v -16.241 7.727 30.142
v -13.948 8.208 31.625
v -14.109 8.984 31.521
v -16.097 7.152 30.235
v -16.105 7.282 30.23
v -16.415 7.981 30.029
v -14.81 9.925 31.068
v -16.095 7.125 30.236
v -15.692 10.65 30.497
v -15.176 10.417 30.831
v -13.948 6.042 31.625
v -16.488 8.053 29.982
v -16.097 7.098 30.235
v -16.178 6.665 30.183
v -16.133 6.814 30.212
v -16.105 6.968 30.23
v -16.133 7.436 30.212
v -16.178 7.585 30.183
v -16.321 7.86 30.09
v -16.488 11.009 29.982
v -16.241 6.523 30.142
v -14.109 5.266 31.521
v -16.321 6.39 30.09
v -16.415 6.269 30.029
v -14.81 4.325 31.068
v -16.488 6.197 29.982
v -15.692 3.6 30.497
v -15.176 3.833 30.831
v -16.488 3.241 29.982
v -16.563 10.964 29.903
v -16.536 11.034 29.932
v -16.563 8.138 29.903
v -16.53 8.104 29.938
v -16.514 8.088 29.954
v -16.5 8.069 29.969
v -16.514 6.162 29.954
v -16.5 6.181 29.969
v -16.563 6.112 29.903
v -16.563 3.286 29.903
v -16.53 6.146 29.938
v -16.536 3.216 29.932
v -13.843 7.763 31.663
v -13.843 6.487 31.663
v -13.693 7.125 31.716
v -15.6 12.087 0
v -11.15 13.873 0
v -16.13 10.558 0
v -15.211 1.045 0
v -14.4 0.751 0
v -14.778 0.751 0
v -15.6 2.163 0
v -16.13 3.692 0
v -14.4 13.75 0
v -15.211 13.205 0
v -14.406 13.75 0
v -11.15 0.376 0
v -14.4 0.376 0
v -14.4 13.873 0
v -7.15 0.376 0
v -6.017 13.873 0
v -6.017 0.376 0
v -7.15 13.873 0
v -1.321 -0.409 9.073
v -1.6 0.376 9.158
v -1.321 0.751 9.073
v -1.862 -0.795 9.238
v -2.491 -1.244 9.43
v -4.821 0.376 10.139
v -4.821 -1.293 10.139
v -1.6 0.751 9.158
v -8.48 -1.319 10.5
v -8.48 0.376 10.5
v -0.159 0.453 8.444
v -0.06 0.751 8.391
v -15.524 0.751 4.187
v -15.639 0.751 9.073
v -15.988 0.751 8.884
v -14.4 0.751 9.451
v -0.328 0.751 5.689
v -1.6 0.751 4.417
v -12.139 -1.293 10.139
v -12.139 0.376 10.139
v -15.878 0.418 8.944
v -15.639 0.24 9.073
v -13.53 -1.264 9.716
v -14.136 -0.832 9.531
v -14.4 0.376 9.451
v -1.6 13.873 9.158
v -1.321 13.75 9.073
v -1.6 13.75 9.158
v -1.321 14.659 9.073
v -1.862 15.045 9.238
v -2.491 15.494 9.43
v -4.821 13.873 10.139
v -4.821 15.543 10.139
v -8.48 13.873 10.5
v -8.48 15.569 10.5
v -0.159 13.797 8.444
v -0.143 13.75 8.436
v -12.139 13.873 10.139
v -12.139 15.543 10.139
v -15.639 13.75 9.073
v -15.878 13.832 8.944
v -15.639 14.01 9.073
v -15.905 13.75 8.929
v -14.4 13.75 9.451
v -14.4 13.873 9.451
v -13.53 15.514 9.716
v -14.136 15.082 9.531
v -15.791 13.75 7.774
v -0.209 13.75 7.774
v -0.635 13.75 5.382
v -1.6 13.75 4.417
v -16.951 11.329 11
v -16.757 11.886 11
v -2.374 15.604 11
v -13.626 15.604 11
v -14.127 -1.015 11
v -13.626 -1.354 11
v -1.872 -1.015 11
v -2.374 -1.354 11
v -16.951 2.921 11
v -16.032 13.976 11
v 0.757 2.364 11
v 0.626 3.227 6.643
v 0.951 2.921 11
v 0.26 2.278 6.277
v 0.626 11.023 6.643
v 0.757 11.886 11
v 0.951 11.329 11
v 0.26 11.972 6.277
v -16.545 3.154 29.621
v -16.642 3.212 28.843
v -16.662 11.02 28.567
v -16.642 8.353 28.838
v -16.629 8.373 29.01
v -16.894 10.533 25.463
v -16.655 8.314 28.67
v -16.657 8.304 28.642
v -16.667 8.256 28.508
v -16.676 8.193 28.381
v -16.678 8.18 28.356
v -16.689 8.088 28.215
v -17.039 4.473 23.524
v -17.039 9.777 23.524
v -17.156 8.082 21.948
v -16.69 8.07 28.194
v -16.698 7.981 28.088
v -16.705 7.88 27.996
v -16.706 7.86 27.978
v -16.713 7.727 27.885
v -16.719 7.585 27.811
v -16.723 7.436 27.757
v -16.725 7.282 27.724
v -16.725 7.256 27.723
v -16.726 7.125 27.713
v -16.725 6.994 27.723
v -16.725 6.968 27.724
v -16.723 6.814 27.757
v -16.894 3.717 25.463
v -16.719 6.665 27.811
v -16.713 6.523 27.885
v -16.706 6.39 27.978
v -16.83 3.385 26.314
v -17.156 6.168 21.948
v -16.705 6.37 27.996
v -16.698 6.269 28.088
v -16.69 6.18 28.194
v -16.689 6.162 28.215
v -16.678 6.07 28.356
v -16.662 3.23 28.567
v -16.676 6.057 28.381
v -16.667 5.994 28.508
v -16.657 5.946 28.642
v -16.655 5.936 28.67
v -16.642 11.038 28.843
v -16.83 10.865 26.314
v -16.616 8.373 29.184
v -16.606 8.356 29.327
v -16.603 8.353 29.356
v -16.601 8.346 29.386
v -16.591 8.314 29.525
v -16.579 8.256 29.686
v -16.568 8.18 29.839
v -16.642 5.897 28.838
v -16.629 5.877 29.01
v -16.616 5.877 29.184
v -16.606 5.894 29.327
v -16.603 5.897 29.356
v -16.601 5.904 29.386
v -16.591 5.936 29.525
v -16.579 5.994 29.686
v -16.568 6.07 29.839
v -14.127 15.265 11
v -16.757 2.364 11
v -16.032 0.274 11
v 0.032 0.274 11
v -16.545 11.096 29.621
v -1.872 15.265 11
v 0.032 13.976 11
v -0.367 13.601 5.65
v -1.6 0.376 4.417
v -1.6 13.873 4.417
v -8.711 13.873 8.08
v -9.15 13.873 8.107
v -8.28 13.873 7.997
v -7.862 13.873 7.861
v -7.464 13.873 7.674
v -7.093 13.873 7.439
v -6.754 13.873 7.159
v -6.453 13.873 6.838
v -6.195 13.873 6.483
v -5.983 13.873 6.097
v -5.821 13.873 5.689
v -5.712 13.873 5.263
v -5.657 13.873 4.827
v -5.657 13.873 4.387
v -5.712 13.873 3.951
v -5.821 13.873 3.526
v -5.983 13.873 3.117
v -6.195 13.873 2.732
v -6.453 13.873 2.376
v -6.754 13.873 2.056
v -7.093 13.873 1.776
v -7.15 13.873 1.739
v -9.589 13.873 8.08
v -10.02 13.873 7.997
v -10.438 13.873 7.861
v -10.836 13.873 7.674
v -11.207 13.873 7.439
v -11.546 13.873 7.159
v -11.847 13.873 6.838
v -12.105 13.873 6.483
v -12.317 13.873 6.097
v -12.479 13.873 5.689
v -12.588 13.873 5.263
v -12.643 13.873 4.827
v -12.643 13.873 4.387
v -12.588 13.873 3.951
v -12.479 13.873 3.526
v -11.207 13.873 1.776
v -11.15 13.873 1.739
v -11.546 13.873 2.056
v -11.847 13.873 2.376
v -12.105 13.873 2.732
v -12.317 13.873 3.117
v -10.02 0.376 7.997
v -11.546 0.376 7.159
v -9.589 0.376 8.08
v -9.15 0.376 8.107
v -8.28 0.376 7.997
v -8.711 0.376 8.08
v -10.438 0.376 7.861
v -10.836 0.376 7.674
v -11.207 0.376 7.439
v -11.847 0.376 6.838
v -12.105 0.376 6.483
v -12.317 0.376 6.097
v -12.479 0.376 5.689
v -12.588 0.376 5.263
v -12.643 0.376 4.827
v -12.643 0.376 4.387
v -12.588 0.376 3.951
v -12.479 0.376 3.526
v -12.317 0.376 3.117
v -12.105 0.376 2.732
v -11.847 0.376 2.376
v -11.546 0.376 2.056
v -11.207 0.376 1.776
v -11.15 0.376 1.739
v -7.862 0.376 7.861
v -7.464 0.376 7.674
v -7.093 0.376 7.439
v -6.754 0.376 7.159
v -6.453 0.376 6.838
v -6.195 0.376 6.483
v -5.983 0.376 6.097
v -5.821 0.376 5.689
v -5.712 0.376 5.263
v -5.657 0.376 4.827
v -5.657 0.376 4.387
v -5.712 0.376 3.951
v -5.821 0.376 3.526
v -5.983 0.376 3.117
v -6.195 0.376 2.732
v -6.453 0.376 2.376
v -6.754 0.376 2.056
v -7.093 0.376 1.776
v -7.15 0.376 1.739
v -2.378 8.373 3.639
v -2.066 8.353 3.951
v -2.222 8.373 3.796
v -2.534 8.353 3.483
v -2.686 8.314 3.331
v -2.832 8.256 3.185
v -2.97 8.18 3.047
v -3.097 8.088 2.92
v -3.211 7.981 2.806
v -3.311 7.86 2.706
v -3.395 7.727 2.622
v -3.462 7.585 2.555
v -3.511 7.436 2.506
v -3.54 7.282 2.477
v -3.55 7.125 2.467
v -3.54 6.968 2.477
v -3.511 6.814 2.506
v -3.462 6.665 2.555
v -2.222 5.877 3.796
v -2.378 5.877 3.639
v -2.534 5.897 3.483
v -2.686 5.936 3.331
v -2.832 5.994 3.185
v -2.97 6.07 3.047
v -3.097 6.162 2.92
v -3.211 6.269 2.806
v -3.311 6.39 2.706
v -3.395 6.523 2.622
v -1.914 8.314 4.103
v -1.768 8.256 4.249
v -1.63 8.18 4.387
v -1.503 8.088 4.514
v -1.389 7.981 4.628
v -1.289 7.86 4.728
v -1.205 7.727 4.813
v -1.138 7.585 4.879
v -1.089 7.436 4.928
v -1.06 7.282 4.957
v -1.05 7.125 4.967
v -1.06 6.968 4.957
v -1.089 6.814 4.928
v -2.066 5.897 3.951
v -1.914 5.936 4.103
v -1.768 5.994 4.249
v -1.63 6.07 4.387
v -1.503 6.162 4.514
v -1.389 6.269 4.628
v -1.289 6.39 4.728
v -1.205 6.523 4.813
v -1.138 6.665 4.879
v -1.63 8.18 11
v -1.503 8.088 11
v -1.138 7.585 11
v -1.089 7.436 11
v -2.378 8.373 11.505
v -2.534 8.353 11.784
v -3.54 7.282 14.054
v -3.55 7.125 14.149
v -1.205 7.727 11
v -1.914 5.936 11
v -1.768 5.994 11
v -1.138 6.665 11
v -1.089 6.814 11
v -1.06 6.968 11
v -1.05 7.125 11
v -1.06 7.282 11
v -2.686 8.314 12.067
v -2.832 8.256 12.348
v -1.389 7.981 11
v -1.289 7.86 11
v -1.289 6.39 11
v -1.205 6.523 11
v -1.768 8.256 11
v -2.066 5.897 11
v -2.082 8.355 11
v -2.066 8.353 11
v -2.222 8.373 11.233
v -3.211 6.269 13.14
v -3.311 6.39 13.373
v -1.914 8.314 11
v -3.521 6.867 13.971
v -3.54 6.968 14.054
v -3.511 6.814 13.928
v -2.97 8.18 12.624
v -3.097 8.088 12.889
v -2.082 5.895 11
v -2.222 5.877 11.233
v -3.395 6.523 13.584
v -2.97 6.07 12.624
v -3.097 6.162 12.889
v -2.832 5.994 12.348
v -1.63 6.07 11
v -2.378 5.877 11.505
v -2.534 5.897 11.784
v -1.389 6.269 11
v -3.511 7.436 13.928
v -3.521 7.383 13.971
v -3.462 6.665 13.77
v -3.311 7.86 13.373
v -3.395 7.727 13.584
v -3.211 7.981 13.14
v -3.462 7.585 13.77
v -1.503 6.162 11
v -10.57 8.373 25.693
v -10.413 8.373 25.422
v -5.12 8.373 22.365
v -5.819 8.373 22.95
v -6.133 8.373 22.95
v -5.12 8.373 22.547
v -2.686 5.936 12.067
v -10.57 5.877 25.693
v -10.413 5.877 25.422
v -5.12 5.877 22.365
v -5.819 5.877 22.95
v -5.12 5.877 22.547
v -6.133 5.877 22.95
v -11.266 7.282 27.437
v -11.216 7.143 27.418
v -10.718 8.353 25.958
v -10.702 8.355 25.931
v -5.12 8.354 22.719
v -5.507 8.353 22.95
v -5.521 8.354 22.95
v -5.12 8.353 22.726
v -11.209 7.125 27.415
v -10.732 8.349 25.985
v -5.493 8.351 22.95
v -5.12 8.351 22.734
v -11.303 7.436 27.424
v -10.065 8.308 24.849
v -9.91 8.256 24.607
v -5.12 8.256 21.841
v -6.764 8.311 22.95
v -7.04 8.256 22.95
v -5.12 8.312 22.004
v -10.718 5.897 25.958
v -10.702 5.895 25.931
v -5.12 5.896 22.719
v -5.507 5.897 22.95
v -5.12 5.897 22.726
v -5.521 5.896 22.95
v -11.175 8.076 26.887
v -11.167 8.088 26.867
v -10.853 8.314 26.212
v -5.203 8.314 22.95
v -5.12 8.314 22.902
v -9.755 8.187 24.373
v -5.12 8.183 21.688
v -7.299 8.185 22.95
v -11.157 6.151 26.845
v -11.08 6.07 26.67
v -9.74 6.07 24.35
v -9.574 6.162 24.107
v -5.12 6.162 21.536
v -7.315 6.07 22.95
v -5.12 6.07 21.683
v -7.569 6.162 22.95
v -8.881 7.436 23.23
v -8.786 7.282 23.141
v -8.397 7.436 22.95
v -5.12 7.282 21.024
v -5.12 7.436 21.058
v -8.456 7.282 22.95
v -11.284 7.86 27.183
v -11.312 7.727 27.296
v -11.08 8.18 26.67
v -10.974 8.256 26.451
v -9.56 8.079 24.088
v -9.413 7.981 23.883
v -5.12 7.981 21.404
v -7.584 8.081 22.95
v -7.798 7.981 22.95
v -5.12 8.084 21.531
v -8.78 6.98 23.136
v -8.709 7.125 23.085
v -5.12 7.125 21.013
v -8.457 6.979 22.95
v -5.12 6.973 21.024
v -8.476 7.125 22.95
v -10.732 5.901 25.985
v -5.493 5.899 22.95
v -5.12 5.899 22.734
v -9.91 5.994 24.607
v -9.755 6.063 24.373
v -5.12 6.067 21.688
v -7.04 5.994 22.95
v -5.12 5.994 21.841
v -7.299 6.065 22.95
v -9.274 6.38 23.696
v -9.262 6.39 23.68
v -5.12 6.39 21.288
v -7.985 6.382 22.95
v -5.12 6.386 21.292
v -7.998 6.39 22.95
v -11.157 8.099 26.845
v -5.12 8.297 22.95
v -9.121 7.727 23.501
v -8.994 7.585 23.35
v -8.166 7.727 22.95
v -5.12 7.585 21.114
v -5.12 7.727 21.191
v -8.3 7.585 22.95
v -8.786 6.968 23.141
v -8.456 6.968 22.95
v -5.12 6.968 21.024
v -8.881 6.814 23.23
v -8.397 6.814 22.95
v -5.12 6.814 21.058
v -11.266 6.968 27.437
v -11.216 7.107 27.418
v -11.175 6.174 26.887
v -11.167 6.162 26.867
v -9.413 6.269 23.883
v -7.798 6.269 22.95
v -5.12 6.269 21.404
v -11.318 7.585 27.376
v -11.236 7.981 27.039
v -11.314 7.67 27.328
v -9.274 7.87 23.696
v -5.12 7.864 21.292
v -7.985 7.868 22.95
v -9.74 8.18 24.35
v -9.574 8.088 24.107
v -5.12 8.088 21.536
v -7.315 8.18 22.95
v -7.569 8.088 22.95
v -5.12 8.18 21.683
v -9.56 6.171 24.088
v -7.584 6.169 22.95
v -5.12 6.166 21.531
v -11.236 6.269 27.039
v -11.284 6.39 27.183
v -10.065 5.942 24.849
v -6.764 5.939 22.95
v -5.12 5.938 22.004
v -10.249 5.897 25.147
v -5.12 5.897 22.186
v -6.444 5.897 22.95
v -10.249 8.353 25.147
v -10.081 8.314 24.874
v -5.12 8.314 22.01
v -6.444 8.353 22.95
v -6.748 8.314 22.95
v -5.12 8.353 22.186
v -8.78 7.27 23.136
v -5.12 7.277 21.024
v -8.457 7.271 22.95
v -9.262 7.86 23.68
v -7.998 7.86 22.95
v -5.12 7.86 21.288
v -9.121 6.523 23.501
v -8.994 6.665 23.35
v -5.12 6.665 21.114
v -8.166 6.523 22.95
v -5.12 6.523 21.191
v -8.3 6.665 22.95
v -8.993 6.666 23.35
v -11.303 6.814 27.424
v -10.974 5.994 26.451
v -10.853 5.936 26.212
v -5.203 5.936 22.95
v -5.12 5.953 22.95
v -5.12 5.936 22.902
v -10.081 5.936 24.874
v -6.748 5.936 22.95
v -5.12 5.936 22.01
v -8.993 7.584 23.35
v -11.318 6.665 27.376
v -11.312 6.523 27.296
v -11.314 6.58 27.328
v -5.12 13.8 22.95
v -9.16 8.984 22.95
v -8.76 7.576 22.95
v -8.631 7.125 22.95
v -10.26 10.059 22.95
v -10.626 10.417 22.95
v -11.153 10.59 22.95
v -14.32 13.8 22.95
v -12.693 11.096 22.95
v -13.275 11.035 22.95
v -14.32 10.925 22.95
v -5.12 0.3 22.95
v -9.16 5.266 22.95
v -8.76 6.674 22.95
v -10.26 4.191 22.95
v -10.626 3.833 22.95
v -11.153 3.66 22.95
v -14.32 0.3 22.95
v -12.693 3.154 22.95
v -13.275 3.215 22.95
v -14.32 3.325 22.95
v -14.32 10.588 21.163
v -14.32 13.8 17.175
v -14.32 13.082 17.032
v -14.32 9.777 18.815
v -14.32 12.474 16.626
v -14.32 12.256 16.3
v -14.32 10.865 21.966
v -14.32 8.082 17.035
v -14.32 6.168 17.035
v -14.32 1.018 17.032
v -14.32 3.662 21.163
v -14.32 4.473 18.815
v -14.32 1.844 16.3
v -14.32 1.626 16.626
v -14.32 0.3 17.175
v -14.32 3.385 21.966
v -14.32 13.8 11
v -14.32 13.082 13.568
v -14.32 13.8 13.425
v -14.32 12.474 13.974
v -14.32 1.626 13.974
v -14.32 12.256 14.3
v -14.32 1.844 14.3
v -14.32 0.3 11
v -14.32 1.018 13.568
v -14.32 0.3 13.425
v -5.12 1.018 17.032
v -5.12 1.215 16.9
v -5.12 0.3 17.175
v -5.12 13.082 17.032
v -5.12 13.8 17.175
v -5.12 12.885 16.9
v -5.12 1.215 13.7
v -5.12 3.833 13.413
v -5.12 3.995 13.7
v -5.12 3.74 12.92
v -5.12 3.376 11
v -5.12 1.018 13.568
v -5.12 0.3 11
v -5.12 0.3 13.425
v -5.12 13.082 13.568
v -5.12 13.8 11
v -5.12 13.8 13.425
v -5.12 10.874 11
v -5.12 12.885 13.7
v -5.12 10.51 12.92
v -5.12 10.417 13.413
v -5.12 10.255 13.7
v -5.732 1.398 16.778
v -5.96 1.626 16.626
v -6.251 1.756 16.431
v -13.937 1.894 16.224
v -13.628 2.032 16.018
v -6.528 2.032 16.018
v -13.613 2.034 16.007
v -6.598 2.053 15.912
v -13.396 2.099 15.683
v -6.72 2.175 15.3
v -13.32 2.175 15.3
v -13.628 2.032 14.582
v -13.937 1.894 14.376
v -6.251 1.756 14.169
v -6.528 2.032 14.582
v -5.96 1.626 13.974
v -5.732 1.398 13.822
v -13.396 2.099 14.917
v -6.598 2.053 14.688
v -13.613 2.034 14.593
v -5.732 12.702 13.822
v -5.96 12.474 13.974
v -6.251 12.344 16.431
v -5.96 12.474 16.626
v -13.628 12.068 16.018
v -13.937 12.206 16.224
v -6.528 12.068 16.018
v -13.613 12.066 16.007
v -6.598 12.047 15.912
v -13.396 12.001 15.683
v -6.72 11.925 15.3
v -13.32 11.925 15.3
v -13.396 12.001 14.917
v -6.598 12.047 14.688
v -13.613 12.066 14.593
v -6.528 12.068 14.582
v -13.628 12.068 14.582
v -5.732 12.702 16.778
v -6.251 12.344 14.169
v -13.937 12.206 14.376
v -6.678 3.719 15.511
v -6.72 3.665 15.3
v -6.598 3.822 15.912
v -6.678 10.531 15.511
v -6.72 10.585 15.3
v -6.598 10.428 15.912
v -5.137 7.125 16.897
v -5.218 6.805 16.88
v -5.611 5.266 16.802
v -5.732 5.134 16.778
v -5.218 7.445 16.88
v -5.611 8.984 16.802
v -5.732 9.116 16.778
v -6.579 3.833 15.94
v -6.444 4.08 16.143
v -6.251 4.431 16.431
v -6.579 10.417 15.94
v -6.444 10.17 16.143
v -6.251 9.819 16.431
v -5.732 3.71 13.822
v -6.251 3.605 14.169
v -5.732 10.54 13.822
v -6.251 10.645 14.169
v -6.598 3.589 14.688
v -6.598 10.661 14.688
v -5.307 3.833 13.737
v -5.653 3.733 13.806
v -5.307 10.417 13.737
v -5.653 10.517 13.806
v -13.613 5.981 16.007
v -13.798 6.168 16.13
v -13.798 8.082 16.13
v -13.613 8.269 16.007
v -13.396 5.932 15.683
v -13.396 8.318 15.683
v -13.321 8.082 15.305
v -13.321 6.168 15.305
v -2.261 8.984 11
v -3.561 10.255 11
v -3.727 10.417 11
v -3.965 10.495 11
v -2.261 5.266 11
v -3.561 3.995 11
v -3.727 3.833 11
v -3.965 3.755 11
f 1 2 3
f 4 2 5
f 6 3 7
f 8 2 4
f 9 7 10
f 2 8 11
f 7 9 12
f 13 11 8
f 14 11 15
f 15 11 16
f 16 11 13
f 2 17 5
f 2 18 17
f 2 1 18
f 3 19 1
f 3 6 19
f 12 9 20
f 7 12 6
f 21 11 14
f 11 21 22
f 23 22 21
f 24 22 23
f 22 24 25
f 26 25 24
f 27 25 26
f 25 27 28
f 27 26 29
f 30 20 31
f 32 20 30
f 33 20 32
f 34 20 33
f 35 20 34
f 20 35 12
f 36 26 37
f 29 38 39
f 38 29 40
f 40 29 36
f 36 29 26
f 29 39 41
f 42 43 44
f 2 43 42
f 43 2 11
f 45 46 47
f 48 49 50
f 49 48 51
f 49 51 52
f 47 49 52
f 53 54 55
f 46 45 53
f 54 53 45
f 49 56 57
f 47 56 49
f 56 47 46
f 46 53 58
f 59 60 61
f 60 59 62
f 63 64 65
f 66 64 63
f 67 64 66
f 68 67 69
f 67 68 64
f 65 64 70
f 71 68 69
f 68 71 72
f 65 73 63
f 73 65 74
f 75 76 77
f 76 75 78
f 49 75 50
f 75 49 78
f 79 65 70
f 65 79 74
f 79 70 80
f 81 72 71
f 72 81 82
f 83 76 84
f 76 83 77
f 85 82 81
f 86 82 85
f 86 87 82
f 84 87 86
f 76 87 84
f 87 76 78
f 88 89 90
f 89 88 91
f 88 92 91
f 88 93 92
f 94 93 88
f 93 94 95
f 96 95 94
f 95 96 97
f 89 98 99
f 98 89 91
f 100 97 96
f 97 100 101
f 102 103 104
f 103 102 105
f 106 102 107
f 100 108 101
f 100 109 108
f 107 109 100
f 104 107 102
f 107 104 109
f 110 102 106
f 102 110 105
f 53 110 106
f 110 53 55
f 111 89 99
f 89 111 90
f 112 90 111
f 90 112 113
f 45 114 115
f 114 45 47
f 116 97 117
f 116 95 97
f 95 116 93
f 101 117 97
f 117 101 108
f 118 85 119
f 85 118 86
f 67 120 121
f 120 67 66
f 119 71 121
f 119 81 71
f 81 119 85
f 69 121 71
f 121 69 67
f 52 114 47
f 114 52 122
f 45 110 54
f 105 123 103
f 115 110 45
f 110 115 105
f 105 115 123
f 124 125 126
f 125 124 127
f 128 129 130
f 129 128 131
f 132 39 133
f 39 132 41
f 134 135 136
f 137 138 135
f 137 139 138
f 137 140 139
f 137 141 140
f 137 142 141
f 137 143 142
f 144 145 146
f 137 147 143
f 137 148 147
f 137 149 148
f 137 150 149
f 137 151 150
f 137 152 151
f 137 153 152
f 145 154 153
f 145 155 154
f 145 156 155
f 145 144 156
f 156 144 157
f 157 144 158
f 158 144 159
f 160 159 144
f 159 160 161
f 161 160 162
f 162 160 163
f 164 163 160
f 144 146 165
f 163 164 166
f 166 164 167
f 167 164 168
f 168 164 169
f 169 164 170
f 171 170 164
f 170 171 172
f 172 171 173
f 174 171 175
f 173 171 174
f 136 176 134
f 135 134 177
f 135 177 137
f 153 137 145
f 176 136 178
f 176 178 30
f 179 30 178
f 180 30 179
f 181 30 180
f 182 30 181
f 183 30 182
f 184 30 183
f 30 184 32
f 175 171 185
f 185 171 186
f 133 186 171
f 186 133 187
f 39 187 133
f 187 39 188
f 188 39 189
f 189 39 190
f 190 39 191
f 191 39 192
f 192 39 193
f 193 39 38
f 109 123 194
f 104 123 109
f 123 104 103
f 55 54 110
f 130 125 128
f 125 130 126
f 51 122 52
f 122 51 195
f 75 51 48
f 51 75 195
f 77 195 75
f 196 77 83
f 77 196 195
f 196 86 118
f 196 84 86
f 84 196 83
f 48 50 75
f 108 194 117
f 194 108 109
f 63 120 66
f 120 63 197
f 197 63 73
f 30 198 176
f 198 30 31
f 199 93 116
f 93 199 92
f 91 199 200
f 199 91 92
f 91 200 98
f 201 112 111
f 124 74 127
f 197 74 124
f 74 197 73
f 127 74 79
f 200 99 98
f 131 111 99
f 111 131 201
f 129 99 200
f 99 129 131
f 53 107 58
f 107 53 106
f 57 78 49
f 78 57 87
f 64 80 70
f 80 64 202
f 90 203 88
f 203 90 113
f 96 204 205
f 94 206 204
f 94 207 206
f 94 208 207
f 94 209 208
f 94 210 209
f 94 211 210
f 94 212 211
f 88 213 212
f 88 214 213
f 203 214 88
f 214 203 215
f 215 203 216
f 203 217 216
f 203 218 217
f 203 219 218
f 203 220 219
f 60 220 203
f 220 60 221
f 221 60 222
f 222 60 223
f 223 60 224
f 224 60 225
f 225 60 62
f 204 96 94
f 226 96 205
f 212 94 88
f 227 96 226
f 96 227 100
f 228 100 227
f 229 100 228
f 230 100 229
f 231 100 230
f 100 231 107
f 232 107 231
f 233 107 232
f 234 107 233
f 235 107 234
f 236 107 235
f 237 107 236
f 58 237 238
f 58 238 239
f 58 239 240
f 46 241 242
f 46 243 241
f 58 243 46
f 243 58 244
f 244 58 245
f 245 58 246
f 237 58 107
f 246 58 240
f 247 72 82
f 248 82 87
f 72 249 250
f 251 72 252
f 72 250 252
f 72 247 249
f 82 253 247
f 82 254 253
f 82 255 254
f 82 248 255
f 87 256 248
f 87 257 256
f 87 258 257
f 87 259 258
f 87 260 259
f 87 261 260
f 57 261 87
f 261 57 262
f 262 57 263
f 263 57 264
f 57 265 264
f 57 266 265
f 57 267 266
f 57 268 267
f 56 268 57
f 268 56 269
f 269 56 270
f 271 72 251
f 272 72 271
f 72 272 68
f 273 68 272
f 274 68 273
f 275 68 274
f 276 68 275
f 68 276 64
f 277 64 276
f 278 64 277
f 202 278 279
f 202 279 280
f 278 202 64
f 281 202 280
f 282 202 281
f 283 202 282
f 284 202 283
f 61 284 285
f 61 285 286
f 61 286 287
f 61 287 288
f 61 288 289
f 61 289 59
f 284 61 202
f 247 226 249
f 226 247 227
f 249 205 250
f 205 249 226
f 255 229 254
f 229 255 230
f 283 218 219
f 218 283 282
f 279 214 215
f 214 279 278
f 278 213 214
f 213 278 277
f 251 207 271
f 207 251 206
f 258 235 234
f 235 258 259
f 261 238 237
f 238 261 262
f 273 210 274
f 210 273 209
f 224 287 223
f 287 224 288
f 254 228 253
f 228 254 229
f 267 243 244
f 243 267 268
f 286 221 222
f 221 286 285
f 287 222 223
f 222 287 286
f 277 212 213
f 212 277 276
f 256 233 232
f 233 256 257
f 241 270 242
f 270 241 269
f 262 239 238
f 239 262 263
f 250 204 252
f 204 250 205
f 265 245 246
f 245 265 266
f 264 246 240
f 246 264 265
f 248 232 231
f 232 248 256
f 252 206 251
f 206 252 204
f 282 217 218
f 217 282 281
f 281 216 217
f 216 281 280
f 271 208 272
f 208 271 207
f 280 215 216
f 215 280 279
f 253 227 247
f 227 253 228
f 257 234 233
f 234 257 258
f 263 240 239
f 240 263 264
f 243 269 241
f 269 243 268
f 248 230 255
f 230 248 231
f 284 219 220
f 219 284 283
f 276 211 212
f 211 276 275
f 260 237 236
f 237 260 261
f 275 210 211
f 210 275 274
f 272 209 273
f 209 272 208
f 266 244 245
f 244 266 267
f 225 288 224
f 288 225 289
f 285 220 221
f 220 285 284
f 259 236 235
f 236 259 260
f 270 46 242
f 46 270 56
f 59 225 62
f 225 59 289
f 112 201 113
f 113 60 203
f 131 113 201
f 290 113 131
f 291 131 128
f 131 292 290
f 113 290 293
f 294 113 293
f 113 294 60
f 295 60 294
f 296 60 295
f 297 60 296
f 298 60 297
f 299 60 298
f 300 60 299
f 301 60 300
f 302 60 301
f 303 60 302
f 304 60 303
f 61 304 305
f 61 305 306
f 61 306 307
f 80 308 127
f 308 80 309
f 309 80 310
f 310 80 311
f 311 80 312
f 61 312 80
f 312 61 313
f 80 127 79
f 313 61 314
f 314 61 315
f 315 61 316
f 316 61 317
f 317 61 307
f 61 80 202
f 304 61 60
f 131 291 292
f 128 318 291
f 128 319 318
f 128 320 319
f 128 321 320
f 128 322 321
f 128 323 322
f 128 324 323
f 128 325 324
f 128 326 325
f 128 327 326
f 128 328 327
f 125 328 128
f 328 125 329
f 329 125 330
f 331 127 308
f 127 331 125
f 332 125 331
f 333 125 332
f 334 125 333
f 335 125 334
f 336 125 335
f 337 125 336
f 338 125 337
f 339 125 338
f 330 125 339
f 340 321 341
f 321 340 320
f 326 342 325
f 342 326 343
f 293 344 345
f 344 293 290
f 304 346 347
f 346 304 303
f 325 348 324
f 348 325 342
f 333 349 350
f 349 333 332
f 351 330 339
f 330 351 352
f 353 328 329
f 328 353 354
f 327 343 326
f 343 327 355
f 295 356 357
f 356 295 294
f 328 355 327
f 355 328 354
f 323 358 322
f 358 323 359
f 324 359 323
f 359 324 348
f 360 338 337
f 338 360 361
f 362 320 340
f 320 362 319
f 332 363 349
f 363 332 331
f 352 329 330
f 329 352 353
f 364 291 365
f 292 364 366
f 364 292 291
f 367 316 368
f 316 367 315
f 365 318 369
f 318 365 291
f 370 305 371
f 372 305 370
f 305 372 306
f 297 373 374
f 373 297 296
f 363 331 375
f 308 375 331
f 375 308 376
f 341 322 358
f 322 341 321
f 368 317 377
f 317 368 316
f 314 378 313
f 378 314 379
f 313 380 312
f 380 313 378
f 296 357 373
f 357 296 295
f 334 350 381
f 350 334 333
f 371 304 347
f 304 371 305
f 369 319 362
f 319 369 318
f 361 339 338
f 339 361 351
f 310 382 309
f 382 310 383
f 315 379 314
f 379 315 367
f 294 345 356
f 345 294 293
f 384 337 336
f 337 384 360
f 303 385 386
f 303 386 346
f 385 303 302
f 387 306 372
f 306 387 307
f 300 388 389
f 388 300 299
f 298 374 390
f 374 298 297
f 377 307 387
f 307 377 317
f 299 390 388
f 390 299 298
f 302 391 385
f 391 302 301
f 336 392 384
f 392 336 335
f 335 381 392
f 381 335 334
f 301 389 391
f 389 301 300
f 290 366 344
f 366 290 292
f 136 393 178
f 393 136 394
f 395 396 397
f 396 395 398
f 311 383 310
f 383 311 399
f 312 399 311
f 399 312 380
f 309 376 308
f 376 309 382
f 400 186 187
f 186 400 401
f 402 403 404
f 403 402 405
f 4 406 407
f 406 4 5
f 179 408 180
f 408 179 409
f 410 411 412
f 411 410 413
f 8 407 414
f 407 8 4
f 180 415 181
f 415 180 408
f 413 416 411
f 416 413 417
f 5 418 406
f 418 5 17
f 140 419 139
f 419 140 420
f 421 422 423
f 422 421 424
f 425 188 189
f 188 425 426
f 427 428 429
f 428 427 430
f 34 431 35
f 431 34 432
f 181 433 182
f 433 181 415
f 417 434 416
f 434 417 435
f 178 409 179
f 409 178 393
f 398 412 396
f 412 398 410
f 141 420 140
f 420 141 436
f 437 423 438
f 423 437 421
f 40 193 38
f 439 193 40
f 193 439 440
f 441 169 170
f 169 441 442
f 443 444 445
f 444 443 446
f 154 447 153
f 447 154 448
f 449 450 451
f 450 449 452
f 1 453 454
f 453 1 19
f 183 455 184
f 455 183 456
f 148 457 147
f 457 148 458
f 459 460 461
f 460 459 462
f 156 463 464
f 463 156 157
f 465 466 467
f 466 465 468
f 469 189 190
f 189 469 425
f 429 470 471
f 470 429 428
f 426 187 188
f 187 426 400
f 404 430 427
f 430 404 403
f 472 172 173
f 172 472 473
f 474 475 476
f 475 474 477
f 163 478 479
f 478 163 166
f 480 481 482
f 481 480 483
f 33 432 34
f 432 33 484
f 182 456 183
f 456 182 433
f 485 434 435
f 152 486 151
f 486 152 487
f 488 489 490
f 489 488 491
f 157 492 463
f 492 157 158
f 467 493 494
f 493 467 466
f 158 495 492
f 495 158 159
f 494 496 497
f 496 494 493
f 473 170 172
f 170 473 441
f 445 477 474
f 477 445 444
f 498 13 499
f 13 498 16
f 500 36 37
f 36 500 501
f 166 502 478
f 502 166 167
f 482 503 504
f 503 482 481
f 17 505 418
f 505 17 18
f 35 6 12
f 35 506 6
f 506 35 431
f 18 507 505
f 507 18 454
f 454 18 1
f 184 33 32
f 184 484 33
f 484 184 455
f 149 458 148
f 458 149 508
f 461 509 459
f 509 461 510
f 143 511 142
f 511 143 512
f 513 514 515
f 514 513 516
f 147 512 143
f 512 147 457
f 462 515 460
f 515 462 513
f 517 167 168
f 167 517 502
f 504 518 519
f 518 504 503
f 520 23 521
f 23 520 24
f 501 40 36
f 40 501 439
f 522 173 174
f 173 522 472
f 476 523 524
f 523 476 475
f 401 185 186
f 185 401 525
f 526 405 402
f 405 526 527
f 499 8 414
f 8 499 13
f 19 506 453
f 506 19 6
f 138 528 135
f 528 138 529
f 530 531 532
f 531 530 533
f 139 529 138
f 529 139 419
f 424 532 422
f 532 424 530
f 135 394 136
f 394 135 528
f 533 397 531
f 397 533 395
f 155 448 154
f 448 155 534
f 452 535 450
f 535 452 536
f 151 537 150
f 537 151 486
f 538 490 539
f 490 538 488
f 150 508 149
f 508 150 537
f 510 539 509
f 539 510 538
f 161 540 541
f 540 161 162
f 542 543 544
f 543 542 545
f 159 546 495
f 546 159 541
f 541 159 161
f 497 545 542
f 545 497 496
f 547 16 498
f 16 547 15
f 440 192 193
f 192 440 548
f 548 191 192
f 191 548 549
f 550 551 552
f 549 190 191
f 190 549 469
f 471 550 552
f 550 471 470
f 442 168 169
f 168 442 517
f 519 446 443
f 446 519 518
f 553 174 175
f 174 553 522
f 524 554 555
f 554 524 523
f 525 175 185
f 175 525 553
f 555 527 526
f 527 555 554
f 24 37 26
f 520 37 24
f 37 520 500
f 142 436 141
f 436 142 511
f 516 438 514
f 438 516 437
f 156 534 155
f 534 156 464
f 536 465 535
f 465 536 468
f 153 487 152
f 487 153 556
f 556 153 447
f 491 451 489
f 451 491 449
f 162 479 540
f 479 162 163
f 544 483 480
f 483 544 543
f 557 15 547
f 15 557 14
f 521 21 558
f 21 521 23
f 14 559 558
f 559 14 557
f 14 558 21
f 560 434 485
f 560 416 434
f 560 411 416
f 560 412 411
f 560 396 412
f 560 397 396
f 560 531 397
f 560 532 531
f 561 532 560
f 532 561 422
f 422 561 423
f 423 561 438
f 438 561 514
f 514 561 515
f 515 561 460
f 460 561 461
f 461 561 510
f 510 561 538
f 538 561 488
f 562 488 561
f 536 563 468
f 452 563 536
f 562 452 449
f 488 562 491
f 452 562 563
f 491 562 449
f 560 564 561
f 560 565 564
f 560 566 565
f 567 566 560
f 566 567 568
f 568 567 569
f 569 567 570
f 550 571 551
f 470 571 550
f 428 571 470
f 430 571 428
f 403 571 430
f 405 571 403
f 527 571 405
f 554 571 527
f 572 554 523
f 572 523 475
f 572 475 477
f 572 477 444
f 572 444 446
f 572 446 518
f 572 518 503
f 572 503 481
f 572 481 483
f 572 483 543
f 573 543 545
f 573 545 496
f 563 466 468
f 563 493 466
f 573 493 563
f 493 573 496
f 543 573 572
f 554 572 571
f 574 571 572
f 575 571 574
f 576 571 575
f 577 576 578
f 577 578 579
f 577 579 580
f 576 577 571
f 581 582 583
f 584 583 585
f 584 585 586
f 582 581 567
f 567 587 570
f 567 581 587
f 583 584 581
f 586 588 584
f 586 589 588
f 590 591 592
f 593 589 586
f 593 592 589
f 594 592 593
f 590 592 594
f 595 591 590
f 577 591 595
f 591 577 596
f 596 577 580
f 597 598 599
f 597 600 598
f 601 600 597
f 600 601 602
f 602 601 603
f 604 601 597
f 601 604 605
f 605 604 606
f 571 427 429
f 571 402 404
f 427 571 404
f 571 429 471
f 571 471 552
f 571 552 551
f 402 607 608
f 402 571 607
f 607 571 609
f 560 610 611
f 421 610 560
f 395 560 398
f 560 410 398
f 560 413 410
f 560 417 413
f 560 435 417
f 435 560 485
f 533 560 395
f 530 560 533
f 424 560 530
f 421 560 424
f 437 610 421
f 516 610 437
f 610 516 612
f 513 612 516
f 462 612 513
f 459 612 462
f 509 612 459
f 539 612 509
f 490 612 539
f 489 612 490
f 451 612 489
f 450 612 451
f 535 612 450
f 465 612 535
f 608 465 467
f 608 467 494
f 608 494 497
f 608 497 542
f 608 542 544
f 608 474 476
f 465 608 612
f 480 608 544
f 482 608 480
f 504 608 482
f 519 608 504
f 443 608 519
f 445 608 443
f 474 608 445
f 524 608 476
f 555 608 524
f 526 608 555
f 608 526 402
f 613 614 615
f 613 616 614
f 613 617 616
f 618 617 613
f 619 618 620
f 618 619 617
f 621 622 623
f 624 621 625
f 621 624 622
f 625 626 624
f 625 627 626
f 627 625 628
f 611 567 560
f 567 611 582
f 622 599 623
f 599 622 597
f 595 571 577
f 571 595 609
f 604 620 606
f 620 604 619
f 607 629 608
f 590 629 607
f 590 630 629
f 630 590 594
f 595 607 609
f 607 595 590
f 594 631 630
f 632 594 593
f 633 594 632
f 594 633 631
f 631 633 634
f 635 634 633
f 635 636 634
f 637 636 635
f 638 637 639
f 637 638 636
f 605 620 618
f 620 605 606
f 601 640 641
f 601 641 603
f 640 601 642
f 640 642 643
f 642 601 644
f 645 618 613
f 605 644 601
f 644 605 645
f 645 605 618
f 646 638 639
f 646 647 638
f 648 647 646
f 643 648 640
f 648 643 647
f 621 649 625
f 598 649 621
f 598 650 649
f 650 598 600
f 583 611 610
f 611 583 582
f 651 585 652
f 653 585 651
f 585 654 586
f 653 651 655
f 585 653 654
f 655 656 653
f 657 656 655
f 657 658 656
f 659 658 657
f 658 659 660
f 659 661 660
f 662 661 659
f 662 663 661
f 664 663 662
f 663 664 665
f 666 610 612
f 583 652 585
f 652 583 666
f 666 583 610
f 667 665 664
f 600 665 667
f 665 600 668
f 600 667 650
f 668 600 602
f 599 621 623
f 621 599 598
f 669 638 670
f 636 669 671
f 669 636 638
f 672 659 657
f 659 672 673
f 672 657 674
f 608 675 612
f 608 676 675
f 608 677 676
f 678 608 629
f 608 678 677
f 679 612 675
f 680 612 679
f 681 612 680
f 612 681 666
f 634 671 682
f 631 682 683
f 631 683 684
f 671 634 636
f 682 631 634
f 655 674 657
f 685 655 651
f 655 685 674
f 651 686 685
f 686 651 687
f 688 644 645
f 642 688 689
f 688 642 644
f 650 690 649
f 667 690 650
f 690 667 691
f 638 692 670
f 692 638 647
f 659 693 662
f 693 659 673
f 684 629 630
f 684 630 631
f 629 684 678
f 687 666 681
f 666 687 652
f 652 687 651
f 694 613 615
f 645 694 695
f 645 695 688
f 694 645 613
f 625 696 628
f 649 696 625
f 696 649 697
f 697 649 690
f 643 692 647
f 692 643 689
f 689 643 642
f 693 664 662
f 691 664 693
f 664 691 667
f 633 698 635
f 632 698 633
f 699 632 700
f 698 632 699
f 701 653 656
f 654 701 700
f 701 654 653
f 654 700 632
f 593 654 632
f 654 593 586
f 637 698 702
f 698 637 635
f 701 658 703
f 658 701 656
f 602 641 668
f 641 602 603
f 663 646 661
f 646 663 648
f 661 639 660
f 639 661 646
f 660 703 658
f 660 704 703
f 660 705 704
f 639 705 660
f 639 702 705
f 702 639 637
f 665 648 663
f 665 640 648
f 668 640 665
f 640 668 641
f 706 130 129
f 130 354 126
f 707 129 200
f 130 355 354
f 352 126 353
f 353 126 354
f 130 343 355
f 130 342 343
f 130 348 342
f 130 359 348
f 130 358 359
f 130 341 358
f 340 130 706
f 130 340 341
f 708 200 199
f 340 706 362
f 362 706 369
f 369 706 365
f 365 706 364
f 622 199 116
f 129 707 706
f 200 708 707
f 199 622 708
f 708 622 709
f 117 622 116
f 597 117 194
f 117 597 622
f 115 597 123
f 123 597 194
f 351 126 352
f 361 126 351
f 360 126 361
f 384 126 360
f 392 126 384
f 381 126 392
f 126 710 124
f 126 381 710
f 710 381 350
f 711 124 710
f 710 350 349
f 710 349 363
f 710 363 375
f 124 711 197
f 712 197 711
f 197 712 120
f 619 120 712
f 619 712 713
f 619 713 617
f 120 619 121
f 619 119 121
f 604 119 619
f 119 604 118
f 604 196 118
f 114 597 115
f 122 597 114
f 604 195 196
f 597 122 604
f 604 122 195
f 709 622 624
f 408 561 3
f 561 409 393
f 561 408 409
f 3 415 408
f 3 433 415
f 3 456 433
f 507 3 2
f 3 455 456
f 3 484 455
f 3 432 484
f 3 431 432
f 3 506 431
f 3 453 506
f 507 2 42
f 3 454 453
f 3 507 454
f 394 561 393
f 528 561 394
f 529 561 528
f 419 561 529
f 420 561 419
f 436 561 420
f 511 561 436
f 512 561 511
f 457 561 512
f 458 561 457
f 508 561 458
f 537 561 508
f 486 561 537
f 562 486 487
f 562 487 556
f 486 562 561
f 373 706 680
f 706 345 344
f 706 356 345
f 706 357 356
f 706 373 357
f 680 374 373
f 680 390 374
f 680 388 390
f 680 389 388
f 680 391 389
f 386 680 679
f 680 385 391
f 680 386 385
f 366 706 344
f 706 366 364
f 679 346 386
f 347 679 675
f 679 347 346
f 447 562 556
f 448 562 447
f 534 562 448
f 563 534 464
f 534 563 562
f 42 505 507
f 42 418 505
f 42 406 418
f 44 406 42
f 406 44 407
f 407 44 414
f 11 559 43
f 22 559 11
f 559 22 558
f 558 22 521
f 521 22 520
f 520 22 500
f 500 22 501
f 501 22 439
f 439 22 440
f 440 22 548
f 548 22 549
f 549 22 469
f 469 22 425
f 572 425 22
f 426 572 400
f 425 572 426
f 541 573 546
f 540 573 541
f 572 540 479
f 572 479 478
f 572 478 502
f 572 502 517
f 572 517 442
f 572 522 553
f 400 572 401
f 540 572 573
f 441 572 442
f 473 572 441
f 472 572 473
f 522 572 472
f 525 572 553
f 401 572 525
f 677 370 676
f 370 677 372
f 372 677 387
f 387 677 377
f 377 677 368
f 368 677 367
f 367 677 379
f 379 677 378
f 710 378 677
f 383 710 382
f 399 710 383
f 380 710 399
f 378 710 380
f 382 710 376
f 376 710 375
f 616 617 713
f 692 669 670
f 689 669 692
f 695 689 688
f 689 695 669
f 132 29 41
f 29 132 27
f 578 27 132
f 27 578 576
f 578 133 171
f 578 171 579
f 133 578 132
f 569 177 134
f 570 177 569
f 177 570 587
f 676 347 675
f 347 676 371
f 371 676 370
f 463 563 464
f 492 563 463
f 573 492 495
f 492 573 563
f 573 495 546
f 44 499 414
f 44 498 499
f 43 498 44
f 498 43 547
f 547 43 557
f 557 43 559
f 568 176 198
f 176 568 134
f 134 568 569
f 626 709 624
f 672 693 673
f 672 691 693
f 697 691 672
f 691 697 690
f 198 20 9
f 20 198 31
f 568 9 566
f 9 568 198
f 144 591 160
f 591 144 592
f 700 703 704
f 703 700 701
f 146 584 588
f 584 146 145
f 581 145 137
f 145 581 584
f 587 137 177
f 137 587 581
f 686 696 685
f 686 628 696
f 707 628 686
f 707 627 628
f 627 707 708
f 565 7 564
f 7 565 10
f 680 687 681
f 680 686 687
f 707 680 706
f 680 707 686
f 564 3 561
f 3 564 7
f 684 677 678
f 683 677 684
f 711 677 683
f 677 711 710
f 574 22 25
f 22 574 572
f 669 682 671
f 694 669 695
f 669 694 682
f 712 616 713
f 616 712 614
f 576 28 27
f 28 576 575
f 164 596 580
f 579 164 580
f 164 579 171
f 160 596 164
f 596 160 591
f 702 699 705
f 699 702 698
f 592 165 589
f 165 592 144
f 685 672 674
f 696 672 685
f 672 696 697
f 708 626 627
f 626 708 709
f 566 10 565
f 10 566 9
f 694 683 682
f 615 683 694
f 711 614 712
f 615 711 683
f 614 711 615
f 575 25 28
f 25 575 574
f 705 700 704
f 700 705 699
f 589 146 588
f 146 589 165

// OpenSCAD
// file: util/finger_mid.scad
include <../../config.scad>
use <finger_base.scad>

rotate([0,-90,0]) fingermid();

//	Middle segment of finger, can be lengthened
module fingermid(length=19, proximalHole=true, distalHole=true)
{
	difference() {
		scale([yScaleFactor,xScaleFactor,zScaleFactor]) {
			fingerbasesolid(length);
		}
		if(proximalHole) {
			translate([0,knucklePadding/2 * xScaleFactor,0]) fingerhardwarecutouts(jointDia, jointThick, knuckleW=knuckleW-knucklePadding, fingerLen=length);
		}
		if(distalHole) {
			translate([length * yScaleFactor,0,0]) mirror([1,0,0]) fingerhardwarecutouts(jointDia, jointThick, knuckleW=knuckleW, fingerLen=length);
		}
	}
}
// file: util/finger_base.scad
include <../../config.scad>

rotate([0,-90,0]) fingerbase();

//	Base segment of finger, can be lengthened
module fingerbase(length=20, proximalHole=true, distalHole=true)
{
	difference() {
		scale([yScaleFactor,xScaleFactor,zScaleFactor]) {
			fingerbasesolid(length);
		}
		if(proximalHole) {
			translate([0,knucklePadding/2 * xScaleFactor,0]) fingerhardwarecutouts(jointDia, jointThick, knuckleW=knuckleW-knucklePadding, fingerLen=length);
		}
		if (distalHole) {
			translate([length * yScaleFactor,0,0]) mirror([1,0,0]) fingerhardwarecutouts(jointDia, jointThick, knuckleW=knuckleW, fingerLen=length);
		}
	}


	
}

module fingerhardwarecutouts(jointDia,jointThick,knuckleW,fingerLen,holeCutoff=100) {
	//slot for flex joint
	translate([7 - (15/jointDia),0,6*zScaleFactor - (1.8/jointThick)]) {
		rotate([90,0,0]) translate([-0.25,0,-knuckleW*xScaleFactor]) cylinder(d=jointDia, h=knuckleW*xScaleFactor, $fn=50);
		translate([-25,(knuckleW*xScaleFactor) / 2,0]) cube([50,knuckleW*xScaleFactor,jointThick], center=true);
	}
	//cubic parts
	translate([-100,0,0]) cube([100,knuckleW*xScaleFactor,100]);
	translate([-13/zScaleFactor,0,0]) rotate([0,45,0]) translate([-50,0,0]) cube([100,knuckleW * xScaleFactor, 10]);

	//channel for string/tendon
	translate([-fingerLen/2 * yScaleFactor, knuckleW/2 * xScaleFactor, 2.3]) rotate([0,90,0]) cylinder(d=2.5, h=holeCutoff, $fn=50);
}

//	base segment of finger, solid
module fingerbasesolid(length=50, cutout=true) {
	difference() {
		//cubic part
		translate([0,0.001 + knucklePadding/2,1]) cube([length, knuckleW - knucklePadding - 0.002, 8]);
	}
	
	//cylindrical-ish part around finger
	intersection() {
		//overly large shape to get the cross section in the XZ plane from
		difference() {
			union() {
				translate([length-4,-5,5]) rotate([-90,0,0]) cylinder(r=8,h=knuckleW + 10);
				translate([0,-5,-5]) cube([length,knuckleW + 10,20]);
			}
			//cutout for the side "guards" of the previous knuckle
			if(cutout) {
				translate([-4,-knuckleW+0.001,5.3]) rotate([-90,0,0]) cylinder(r=11,h=10);
				translate([-4,knuckleW - knucklePadding*(1/xScaleFactor),5.3]) rotate([-90,0,0]) cylinder(r=11,h=10);
			}
		}

		hull() {
			for(i=[-1,1], j=[-1,1]) {
				//angled cylinders to provide the outer shape of the finger
				translate([length/10,i*2.4 + knuckleW/2,j*2.2 + 5]) rotate([i*j*-4,j*86,0]) cylinder(d=6,h=20,center=true);
				translate([length+4, i*2.4 + knuckleW/2, j*2.2 + 5]) rotate([i*j*-4,j*-86,0]) cylinder(d=6,h=20,center=true);
			}
		}
	}
}
// file: util/finger_tip.scad
include <../../config.scad>
use <finger_base.scad>
use <finger_mid.scad>

rotate([0,-90,0]) fingertip_curved_solid(pad=fingerPads);

module fingertip_curved_solid(length=17, pad=true, hole=true) {
//	if (!pad)
//		fingertip(length=length);
//	else {
		render() difference() {
			union() {
				fingermid(length=length+3, proximalHole=true, distalHole=false);
				translate([length*yScaleFactor - 0.5,0,1.6*zScaleFactor]) rotate([0,30,0]) fingertip(length=15, proximalHole=false, cutout=false);
			}
			//hole for string
			if(hole) translate([0,xScaleFactor * knuckleW/2,2]) rotate([0,90,0]) cylinder(d=2.5,h=100, $fn=50);
			//hollow for soft pad
			if(pad) translate([length*yScaleFactor - 0.5,0,1.6*zScaleFactor]) rotate([0,30,0]) fingertip_pad(length=15);
		}
//	}
}

module fingertip_solid(length=15, pad=true) {
	if (!pad)
		fingertip(length=length);
	else {
		render() difference() {
			fingertip(length=length);
			if(pad) fingertip_pad(length);
		}
	}
}

module fingertip_pad(length) {
	difference() {
		fingertip(length,pad=false, proximalHole=false, cutout=false);
		translate([0,-10,-10]) cube([length-7,50,50]);
		assign($fn = 16) difference() {
			translate([0,0.2*xScaleFactor,3.2*zScaleFactor]) cube([length+(3.3*yScaleFactor),xScaleFactor * (knuckleW - knucklePadding),5.75*zScaleFactor]);
			//grooves for attachment of silicone pad:
			translate([(length+(3.3*yScaleFactor))/3*2, 0.2*xScaleFactor, 3.2*zScaleFactor]) cylinder(d=2.5*yScaleFactor,h=5.75*zScaleFactor);
			translate([(length+(3.3*yScaleFactor))/3*2, 0.2*xScaleFactor + (xScaleFactor * (knuckleW - knucklePadding)), 3.2*zScaleFactor]) cylinder(d=2.5*yScaleFactor,h=5.75*zScaleFactor);
			translate([(length+(3.3*yScaleFactor))/3*2, 0.2*xScaleFactor, 3.2*zScaleFactor]) rotate([-90,0,0]) cylinder(d=2*zScaleFactor,h=xScaleFactor * (knuckleW - knucklePadding));
			translate([(length+(3.3*yScaleFactor))/3*2, 0.2*xScaleFactor, 3.2*zScaleFactor + 5.75*zScaleFactor]) rotate([-90,0,0]) cylinder(d=1.25*zScaleFactor,h=xScaleFactor * (knuckleW - knucklePadding));
		}
		//"fingernail":
		translate([0,xScaleFactor * knuckleW/2,0]) {
			rotate([0,60,0]) cylinder(d=8, h=100);
		}
	}
}

//	tip segment of finger, can be lengthened
module fingertip(length=15, proximalHole=true, cutout=true)
{
	intersection() {
		difference() {
			scale([yScaleFactor,xScaleFactor,zScaleFactor]) {
				fingerbasesolid(length,cutout);
			}
			if(proximalHole) {
				translate([0,knucklePadding/2 * xScaleFactor,0]) fingerhardwarecutouts(jointDia, jointThick, knuckleW=knuckleW-knucklePadding, fingerLen=length, holeCutoff=(length-0.5)*2);
				translate([(length - 5) * yScaleFactor,(knuckleW/2) * xScaleFactor,0])
					rotate([0,30,0]) translate([0,0,2]) cylinder(d=2.5, h=100, $fn=50);
			}
		}
		translate([(length-10)*xScaleFactor,0,21*zScaleFactor]) rotate([-90,0,0]) cylinder(d=70, h=100, center=true);
	}
}
// file: ../config.scad
/**
 * Configuration settings for Flexy Beast, required to generate correctly sized STLs of the printed parts. See the Configuration File Assembly instructions to set this up.
 * @id config_file
 * @name Configuration File
 * @category Prerequisites!
 * @step Open config.scad in your favorite text editor.
 * @step As per the normal Cyborg Beast instructions, measure the width of the knuckles in the non-affected hand and convert to millimeters.
 * @step Add 5 to that result and then divide by 55.
 * @step Replace the x-, y-, and zScaleFactor variables in config.scad with that number.
 * @step If desired, adjust the proportions of the hand by changing those variables individually. xScaleFactor controls the width of the hand, yScaleFactor controls the length, and zScaleFactor controls the height.
 * @step Open assembly.scad in OpenSCAD to check that the flexy joint holes are not too large for the hand (should only be necessary for small children). If necessary, reduce the jointDia and jointThick variables. jointDia=5 and jointThick=2 is a good amount for smaller hands.
 * @step Set the fingerPads variable to true or false depending on whether you want to cast silicone finger pads for improved grip.
 * @step Open palm.scad, finger_base.scad, finger_tip.scad, and thumb_tip.scad in OpenSCAD, render each part (F6), and export as STL, then print. Suggested print settings are 0.2mm or smaller layer height, 3 perimeters, and 25% rectilinear or hexagonal infill.
 */

knuckleR = 4.85;
knucklePadding = 0.5;
knuckleW = 9.5;
wristH = 10;
palmH = 20;
palmW = 64;
th = 3;
fn = 32;

//flexy joint parameters
jointDia = 7;
jointThick = 4;

//finger settings
fingerPads = true; //whether or not to hollow the finger tips slightly for molding pads
padPositive = false; //if false (default), finger_tip_mold.scad renders a mold to make silicone finger pads; if true, renders a printable flexible finger pad
fingerLength = 1; //multiply the length of all fingers by this amount
thumbProp = 0.8; //proportion of thumb length relative to other fingers (note that the thumb is a segment shorter than the other fingers already)
indexProp = 0.8; //proportion of index finger length relative to other fingers
middleProp = 1; //proportion of middle finger length relative to other fingers
ringProp = 0.8; //proportion of ring finger length relative to other fingers
pinkyProp = 0.7; //proportion of pinky finger length relative to other fingers

//misc settings
thermoform = true; //whether or not to generate a thermoformable mesh for the palm

//desired scale factor for hand based on the standard Cyborg Beast/Robohand sizing guide
xScaleFactor = 1.5; // [1.05:1.60]
yScaleFactor = 1.5; // [1.05:1.60]
zScaleFactor = 1.6; // [1.05:1.60]
// main file
include <../config.scad>
use <util/finger_tip.scad>

rotate([0,-90,0]) thumbtip();

/**
 * Distal phalanx of thumb - rendered from parts/thumb_tip.scad
 * @id thumb_tip
 * @name Thumb Tip
 * @category Printed
 */

module thumbtip()
	{
	//	difference() {
	fingertip_solid(length=18, pad=fingerPads);
	//	translate([20/2,0,0]) cube([20,70,50], center=true); }
	}
